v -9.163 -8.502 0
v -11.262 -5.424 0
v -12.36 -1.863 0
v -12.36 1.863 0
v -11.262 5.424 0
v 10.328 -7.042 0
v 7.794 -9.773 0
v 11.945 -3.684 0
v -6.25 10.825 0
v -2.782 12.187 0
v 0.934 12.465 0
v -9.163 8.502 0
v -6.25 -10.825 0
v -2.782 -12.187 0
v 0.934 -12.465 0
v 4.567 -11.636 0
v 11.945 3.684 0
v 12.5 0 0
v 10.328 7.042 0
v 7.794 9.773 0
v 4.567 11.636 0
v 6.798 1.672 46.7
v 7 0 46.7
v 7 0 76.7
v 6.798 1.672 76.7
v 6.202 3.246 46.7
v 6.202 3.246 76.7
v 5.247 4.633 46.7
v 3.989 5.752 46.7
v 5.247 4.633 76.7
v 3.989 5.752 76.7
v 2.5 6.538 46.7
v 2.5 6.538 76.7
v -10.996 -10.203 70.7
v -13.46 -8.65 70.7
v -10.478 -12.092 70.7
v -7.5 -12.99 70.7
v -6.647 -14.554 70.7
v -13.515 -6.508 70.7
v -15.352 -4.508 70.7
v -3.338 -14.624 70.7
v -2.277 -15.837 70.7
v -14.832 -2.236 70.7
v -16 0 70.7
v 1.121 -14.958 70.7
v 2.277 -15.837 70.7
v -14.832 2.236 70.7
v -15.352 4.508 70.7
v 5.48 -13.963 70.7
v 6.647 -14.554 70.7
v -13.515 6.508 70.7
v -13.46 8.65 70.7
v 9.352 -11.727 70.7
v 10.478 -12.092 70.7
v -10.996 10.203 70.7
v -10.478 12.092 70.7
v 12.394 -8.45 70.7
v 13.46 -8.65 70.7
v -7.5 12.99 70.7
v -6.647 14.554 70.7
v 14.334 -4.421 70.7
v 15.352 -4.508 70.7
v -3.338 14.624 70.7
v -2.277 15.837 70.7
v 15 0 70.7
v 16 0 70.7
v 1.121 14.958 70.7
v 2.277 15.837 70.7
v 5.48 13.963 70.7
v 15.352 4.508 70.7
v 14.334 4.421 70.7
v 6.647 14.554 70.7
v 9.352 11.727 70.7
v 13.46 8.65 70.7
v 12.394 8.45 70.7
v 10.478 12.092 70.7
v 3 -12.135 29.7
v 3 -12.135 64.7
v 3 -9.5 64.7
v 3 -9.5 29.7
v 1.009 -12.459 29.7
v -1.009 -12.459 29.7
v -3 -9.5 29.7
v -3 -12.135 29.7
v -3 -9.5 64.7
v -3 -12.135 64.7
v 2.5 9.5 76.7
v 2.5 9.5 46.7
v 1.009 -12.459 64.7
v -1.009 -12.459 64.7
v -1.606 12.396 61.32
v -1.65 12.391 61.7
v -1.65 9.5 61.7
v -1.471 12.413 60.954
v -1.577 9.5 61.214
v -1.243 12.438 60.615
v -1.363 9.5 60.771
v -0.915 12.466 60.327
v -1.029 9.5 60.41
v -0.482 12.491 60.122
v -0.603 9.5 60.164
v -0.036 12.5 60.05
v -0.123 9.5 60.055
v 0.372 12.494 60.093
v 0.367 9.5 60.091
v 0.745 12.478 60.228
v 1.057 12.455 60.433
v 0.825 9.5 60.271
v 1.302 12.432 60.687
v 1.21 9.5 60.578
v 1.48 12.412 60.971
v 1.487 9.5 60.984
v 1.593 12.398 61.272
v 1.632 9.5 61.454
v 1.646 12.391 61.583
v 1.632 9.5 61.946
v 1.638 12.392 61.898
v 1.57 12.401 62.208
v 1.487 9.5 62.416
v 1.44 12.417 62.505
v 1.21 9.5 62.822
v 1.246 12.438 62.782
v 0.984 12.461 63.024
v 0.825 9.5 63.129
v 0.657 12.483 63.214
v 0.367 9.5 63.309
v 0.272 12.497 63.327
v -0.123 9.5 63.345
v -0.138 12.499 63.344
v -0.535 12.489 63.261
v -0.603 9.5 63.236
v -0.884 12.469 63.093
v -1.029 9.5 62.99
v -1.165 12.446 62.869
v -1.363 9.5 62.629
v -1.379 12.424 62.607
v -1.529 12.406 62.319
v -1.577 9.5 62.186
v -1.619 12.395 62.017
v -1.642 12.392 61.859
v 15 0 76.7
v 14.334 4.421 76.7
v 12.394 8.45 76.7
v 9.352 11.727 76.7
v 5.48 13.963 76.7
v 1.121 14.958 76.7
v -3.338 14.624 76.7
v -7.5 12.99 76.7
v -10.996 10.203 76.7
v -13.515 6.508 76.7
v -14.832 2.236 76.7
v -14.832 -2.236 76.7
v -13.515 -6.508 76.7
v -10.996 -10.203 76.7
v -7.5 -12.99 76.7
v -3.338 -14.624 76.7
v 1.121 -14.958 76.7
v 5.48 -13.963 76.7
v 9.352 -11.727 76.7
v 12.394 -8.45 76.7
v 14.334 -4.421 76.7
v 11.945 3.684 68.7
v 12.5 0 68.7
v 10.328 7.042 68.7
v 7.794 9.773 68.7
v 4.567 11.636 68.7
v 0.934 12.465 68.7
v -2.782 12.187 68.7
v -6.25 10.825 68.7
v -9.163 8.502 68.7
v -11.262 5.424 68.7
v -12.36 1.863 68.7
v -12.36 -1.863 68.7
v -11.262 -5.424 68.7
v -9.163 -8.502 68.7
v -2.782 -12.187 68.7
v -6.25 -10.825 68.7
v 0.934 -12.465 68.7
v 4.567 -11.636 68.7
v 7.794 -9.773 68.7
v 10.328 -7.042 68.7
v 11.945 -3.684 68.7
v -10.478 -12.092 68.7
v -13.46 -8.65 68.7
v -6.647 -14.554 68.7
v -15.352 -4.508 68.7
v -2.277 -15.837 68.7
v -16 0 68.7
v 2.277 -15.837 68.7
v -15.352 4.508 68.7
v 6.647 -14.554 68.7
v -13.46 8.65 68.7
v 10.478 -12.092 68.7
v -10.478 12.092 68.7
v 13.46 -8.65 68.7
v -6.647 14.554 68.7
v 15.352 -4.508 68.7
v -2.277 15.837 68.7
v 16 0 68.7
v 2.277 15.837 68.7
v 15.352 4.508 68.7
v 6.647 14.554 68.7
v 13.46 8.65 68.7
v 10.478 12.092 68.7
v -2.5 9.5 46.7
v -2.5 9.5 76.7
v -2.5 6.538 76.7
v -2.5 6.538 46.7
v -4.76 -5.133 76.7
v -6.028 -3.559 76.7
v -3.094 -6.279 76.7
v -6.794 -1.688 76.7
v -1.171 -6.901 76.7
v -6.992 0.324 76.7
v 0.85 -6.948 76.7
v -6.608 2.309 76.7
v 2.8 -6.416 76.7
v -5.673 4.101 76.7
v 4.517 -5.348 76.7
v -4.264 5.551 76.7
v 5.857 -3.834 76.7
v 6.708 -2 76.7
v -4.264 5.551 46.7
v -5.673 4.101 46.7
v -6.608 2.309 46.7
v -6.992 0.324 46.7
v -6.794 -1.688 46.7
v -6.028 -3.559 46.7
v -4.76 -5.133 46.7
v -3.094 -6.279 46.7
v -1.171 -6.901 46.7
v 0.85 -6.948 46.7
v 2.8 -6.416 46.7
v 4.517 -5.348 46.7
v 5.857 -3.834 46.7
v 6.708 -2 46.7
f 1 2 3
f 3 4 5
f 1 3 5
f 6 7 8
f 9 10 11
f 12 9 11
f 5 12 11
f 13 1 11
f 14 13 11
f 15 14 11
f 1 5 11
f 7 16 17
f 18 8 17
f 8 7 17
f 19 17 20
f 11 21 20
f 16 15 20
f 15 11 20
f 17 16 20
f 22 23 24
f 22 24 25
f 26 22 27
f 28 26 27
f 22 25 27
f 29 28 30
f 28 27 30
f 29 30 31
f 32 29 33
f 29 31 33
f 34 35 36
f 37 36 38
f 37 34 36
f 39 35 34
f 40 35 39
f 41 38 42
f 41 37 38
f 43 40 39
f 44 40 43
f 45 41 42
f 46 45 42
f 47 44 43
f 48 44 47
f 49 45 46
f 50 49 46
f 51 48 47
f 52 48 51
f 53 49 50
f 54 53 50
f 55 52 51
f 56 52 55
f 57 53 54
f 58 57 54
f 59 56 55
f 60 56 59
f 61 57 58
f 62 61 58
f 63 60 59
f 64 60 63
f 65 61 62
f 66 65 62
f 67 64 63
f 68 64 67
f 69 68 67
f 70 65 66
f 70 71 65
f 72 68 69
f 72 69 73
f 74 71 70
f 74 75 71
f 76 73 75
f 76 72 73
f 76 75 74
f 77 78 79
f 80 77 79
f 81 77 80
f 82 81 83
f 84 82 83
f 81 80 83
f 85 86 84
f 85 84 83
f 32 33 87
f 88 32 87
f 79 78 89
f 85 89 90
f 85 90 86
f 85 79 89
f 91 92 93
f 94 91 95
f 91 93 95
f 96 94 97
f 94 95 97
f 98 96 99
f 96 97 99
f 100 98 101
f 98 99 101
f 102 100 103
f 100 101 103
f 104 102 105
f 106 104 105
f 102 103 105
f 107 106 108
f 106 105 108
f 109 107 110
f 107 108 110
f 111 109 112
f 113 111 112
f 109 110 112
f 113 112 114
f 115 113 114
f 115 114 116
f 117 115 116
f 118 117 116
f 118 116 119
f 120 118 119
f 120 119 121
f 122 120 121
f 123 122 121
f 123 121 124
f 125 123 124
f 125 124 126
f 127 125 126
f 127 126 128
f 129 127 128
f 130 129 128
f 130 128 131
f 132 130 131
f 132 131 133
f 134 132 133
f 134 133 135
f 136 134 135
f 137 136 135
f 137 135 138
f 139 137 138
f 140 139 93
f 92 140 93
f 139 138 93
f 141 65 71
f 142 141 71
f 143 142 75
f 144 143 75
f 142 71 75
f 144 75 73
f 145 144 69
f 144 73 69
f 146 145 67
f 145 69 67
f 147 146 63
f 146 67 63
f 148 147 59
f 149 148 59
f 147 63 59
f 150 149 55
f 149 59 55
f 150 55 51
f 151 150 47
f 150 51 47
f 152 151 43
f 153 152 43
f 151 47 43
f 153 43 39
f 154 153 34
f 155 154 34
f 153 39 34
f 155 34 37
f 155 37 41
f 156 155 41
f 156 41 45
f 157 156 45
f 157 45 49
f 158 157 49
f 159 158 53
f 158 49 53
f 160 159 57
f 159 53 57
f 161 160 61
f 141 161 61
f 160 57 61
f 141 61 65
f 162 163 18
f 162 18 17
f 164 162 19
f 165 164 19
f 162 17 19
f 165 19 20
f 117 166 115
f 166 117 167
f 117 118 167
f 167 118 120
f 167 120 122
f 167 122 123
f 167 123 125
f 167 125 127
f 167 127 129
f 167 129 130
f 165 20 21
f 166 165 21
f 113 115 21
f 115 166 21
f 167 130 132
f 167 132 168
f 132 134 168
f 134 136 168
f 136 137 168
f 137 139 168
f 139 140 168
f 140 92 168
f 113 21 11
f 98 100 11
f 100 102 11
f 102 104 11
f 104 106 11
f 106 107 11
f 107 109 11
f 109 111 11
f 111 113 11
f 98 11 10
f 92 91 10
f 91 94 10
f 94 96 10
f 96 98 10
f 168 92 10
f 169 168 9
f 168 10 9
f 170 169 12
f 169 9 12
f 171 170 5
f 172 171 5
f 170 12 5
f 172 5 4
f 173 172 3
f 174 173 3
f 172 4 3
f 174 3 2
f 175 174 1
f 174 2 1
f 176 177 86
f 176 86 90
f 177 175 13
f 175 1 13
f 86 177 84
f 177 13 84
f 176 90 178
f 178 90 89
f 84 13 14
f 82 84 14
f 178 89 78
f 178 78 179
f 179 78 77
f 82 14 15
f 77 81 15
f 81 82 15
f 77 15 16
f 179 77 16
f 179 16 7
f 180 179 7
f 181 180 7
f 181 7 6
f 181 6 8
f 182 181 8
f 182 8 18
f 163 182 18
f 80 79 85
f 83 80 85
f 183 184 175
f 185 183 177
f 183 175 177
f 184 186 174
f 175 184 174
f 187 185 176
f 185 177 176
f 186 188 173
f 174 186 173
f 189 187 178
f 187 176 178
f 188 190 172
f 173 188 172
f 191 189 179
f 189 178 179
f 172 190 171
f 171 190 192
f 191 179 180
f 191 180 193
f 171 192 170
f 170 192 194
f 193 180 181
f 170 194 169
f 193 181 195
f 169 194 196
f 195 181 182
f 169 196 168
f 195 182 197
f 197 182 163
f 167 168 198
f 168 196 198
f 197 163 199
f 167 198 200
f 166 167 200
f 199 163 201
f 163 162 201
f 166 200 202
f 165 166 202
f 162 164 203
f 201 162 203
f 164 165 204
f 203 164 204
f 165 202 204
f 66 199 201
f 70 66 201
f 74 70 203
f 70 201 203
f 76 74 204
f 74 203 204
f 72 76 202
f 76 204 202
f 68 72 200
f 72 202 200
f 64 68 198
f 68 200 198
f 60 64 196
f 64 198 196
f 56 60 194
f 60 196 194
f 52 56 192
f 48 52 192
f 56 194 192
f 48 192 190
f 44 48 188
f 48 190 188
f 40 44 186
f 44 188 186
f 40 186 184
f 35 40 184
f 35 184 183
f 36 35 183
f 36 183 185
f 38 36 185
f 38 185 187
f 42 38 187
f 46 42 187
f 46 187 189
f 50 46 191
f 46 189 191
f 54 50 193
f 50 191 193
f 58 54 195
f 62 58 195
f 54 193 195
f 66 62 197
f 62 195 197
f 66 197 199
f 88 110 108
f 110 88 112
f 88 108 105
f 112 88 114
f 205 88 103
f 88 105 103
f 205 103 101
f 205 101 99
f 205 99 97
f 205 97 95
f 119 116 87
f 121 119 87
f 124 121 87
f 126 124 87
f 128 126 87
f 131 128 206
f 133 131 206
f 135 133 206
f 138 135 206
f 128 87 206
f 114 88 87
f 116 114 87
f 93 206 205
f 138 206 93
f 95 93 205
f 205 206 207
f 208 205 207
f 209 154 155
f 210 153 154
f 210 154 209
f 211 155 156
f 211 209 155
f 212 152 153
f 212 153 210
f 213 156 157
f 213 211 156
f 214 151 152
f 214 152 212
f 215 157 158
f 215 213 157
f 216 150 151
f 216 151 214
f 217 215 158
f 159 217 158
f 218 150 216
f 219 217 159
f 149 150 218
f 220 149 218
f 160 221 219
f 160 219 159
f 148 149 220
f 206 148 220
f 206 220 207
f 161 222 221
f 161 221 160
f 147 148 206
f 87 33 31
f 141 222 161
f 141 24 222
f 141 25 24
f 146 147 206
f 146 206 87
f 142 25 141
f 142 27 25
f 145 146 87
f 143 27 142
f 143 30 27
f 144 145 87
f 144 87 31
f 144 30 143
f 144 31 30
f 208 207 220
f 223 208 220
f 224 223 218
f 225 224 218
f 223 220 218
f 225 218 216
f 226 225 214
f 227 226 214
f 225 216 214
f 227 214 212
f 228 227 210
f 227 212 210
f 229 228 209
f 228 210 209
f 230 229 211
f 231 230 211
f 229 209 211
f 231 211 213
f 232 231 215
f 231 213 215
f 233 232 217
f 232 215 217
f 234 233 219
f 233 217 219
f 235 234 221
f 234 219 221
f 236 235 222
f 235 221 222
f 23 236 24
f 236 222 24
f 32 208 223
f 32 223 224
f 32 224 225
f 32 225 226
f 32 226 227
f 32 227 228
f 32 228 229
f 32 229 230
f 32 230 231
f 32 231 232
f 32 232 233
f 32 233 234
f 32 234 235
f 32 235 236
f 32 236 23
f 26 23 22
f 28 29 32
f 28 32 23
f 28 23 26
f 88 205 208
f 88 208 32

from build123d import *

# Parameters (mm, degrees)
SKETCH1_R                 = 12.5
BOSS_EXTRUDE1_DEPTH       = 68.7
SKETCH2_R                 = 16
BOSS_EXTRUDE2_DEPTH       = 2
SKETCH3_R                 = 15
BOSS_EXTRUDE3_DEPTH       = 6
CUT_EXTRUDE1_DEPTH        = 30
SKETCH6_W                 = 6
SKETCH6_H                 = 6
CUT_EXTRUDE2_DEPTH        = 35
M4X0_7_TAPPED_HOLE1_D     = 3.3
M4X0_7_TAPPED_HOLE1_DEPTH = 3


with BuildPart() as part:
    # Sketch1 → Boss-Extrude1 (new body)
    with BuildSketch(Plane.XY):
        Circle(SKETCH1_R)
    extrude(amount=BOSS_EXTRUDE1_DEPTH)

    # Sketch2 → Boss-Extrude2 (add)
    with BuildSketch(Plane.XY.offset(68.7)):
        Circle(SKETCH2_R)
    extrude(amount=BOSS_EXTRUDE2_DEPTH)

    # Sketch3 → Boss-Extrude3 (add)
    with BuildSketch(Plane.XY.offset(70.7)):
        Circle(SKETCH3_R)
    extrude(amount=BOSS_EXTRUDE3_DEPTH)

    # Sketch4 → Cut-Extrude1 (cut)
    with BuildSketch(Plane.XY.offset(76.7)):
        with BuildLine():
            Line((-2.5, 6.538348415), (-2.5, 4.5))
            Line((-2.5, 4.5), (2.5, 4.5))
            Line((2.5, 4.5), (2.5, 6.538348415))
            ThreePointArc((2.5, 6.538348415), (0, 7), (-2.5, 6.538348415))
        make_face()
        with BuildLine():
            Line((2.5, 4.5), (-2.5, 4.5))
            Line((-2.5, 4.5), (-2.5, 6.538348415))
            ThreePointArc((-2.5, 6.538348415), (-3.968626967, -5.766281297), (7, 0))
            ThreePointArc((7, 0), (5.766281297, 3.968626967), (2.5, 6.538348415))
            Line((2.5, 6.538348415), (2.5, 4.5))
        make_face()
        with BuildLine():
            Line((-2.5, 9.5), (-2.5, 6.538348415))
            ThreePointArc((-2.5, 6.538348415), (0, 7), (2.5, 6.538348415))
            Line((2.5, 6.538348415), (2.5, 9.5))
            Line((2.5, 9.5), (-2.5, 9.5))
        make_face()
    extrude(amount=-CUT_EXTRUDE1_DEPTH, mode=Mode.SUBTRACT)

    # Sketch6 → Cut-Extrude2 (cut)
    with BuildSketch(Plane(origin=(0, 0, 64.7), x_dir=(-1, 0, 0), z_dir=(0, 0, -1))):
        with Locations((0, -12.5)):
            Rectangle(SKETCH6_W, SKETCH6_H)
    extrude(amount=CUT_EXTRUDE2_DEPTH, mode=Mode.SUBTRACT)

    # M4x0.7 Tapped Hole1
    with Locations(Plane(origin=(0, 12.5, 0), x_dir=(1, 0, 0), z_dir=(0, 1, 0))):
        with Locations((0, -61.7)):
            Hole(M4X0_7_TAPPED_HOLE1_D / 2, depth=M4X0_7_TAPPED_HOLE1_DEPTH)


solid = part.part
